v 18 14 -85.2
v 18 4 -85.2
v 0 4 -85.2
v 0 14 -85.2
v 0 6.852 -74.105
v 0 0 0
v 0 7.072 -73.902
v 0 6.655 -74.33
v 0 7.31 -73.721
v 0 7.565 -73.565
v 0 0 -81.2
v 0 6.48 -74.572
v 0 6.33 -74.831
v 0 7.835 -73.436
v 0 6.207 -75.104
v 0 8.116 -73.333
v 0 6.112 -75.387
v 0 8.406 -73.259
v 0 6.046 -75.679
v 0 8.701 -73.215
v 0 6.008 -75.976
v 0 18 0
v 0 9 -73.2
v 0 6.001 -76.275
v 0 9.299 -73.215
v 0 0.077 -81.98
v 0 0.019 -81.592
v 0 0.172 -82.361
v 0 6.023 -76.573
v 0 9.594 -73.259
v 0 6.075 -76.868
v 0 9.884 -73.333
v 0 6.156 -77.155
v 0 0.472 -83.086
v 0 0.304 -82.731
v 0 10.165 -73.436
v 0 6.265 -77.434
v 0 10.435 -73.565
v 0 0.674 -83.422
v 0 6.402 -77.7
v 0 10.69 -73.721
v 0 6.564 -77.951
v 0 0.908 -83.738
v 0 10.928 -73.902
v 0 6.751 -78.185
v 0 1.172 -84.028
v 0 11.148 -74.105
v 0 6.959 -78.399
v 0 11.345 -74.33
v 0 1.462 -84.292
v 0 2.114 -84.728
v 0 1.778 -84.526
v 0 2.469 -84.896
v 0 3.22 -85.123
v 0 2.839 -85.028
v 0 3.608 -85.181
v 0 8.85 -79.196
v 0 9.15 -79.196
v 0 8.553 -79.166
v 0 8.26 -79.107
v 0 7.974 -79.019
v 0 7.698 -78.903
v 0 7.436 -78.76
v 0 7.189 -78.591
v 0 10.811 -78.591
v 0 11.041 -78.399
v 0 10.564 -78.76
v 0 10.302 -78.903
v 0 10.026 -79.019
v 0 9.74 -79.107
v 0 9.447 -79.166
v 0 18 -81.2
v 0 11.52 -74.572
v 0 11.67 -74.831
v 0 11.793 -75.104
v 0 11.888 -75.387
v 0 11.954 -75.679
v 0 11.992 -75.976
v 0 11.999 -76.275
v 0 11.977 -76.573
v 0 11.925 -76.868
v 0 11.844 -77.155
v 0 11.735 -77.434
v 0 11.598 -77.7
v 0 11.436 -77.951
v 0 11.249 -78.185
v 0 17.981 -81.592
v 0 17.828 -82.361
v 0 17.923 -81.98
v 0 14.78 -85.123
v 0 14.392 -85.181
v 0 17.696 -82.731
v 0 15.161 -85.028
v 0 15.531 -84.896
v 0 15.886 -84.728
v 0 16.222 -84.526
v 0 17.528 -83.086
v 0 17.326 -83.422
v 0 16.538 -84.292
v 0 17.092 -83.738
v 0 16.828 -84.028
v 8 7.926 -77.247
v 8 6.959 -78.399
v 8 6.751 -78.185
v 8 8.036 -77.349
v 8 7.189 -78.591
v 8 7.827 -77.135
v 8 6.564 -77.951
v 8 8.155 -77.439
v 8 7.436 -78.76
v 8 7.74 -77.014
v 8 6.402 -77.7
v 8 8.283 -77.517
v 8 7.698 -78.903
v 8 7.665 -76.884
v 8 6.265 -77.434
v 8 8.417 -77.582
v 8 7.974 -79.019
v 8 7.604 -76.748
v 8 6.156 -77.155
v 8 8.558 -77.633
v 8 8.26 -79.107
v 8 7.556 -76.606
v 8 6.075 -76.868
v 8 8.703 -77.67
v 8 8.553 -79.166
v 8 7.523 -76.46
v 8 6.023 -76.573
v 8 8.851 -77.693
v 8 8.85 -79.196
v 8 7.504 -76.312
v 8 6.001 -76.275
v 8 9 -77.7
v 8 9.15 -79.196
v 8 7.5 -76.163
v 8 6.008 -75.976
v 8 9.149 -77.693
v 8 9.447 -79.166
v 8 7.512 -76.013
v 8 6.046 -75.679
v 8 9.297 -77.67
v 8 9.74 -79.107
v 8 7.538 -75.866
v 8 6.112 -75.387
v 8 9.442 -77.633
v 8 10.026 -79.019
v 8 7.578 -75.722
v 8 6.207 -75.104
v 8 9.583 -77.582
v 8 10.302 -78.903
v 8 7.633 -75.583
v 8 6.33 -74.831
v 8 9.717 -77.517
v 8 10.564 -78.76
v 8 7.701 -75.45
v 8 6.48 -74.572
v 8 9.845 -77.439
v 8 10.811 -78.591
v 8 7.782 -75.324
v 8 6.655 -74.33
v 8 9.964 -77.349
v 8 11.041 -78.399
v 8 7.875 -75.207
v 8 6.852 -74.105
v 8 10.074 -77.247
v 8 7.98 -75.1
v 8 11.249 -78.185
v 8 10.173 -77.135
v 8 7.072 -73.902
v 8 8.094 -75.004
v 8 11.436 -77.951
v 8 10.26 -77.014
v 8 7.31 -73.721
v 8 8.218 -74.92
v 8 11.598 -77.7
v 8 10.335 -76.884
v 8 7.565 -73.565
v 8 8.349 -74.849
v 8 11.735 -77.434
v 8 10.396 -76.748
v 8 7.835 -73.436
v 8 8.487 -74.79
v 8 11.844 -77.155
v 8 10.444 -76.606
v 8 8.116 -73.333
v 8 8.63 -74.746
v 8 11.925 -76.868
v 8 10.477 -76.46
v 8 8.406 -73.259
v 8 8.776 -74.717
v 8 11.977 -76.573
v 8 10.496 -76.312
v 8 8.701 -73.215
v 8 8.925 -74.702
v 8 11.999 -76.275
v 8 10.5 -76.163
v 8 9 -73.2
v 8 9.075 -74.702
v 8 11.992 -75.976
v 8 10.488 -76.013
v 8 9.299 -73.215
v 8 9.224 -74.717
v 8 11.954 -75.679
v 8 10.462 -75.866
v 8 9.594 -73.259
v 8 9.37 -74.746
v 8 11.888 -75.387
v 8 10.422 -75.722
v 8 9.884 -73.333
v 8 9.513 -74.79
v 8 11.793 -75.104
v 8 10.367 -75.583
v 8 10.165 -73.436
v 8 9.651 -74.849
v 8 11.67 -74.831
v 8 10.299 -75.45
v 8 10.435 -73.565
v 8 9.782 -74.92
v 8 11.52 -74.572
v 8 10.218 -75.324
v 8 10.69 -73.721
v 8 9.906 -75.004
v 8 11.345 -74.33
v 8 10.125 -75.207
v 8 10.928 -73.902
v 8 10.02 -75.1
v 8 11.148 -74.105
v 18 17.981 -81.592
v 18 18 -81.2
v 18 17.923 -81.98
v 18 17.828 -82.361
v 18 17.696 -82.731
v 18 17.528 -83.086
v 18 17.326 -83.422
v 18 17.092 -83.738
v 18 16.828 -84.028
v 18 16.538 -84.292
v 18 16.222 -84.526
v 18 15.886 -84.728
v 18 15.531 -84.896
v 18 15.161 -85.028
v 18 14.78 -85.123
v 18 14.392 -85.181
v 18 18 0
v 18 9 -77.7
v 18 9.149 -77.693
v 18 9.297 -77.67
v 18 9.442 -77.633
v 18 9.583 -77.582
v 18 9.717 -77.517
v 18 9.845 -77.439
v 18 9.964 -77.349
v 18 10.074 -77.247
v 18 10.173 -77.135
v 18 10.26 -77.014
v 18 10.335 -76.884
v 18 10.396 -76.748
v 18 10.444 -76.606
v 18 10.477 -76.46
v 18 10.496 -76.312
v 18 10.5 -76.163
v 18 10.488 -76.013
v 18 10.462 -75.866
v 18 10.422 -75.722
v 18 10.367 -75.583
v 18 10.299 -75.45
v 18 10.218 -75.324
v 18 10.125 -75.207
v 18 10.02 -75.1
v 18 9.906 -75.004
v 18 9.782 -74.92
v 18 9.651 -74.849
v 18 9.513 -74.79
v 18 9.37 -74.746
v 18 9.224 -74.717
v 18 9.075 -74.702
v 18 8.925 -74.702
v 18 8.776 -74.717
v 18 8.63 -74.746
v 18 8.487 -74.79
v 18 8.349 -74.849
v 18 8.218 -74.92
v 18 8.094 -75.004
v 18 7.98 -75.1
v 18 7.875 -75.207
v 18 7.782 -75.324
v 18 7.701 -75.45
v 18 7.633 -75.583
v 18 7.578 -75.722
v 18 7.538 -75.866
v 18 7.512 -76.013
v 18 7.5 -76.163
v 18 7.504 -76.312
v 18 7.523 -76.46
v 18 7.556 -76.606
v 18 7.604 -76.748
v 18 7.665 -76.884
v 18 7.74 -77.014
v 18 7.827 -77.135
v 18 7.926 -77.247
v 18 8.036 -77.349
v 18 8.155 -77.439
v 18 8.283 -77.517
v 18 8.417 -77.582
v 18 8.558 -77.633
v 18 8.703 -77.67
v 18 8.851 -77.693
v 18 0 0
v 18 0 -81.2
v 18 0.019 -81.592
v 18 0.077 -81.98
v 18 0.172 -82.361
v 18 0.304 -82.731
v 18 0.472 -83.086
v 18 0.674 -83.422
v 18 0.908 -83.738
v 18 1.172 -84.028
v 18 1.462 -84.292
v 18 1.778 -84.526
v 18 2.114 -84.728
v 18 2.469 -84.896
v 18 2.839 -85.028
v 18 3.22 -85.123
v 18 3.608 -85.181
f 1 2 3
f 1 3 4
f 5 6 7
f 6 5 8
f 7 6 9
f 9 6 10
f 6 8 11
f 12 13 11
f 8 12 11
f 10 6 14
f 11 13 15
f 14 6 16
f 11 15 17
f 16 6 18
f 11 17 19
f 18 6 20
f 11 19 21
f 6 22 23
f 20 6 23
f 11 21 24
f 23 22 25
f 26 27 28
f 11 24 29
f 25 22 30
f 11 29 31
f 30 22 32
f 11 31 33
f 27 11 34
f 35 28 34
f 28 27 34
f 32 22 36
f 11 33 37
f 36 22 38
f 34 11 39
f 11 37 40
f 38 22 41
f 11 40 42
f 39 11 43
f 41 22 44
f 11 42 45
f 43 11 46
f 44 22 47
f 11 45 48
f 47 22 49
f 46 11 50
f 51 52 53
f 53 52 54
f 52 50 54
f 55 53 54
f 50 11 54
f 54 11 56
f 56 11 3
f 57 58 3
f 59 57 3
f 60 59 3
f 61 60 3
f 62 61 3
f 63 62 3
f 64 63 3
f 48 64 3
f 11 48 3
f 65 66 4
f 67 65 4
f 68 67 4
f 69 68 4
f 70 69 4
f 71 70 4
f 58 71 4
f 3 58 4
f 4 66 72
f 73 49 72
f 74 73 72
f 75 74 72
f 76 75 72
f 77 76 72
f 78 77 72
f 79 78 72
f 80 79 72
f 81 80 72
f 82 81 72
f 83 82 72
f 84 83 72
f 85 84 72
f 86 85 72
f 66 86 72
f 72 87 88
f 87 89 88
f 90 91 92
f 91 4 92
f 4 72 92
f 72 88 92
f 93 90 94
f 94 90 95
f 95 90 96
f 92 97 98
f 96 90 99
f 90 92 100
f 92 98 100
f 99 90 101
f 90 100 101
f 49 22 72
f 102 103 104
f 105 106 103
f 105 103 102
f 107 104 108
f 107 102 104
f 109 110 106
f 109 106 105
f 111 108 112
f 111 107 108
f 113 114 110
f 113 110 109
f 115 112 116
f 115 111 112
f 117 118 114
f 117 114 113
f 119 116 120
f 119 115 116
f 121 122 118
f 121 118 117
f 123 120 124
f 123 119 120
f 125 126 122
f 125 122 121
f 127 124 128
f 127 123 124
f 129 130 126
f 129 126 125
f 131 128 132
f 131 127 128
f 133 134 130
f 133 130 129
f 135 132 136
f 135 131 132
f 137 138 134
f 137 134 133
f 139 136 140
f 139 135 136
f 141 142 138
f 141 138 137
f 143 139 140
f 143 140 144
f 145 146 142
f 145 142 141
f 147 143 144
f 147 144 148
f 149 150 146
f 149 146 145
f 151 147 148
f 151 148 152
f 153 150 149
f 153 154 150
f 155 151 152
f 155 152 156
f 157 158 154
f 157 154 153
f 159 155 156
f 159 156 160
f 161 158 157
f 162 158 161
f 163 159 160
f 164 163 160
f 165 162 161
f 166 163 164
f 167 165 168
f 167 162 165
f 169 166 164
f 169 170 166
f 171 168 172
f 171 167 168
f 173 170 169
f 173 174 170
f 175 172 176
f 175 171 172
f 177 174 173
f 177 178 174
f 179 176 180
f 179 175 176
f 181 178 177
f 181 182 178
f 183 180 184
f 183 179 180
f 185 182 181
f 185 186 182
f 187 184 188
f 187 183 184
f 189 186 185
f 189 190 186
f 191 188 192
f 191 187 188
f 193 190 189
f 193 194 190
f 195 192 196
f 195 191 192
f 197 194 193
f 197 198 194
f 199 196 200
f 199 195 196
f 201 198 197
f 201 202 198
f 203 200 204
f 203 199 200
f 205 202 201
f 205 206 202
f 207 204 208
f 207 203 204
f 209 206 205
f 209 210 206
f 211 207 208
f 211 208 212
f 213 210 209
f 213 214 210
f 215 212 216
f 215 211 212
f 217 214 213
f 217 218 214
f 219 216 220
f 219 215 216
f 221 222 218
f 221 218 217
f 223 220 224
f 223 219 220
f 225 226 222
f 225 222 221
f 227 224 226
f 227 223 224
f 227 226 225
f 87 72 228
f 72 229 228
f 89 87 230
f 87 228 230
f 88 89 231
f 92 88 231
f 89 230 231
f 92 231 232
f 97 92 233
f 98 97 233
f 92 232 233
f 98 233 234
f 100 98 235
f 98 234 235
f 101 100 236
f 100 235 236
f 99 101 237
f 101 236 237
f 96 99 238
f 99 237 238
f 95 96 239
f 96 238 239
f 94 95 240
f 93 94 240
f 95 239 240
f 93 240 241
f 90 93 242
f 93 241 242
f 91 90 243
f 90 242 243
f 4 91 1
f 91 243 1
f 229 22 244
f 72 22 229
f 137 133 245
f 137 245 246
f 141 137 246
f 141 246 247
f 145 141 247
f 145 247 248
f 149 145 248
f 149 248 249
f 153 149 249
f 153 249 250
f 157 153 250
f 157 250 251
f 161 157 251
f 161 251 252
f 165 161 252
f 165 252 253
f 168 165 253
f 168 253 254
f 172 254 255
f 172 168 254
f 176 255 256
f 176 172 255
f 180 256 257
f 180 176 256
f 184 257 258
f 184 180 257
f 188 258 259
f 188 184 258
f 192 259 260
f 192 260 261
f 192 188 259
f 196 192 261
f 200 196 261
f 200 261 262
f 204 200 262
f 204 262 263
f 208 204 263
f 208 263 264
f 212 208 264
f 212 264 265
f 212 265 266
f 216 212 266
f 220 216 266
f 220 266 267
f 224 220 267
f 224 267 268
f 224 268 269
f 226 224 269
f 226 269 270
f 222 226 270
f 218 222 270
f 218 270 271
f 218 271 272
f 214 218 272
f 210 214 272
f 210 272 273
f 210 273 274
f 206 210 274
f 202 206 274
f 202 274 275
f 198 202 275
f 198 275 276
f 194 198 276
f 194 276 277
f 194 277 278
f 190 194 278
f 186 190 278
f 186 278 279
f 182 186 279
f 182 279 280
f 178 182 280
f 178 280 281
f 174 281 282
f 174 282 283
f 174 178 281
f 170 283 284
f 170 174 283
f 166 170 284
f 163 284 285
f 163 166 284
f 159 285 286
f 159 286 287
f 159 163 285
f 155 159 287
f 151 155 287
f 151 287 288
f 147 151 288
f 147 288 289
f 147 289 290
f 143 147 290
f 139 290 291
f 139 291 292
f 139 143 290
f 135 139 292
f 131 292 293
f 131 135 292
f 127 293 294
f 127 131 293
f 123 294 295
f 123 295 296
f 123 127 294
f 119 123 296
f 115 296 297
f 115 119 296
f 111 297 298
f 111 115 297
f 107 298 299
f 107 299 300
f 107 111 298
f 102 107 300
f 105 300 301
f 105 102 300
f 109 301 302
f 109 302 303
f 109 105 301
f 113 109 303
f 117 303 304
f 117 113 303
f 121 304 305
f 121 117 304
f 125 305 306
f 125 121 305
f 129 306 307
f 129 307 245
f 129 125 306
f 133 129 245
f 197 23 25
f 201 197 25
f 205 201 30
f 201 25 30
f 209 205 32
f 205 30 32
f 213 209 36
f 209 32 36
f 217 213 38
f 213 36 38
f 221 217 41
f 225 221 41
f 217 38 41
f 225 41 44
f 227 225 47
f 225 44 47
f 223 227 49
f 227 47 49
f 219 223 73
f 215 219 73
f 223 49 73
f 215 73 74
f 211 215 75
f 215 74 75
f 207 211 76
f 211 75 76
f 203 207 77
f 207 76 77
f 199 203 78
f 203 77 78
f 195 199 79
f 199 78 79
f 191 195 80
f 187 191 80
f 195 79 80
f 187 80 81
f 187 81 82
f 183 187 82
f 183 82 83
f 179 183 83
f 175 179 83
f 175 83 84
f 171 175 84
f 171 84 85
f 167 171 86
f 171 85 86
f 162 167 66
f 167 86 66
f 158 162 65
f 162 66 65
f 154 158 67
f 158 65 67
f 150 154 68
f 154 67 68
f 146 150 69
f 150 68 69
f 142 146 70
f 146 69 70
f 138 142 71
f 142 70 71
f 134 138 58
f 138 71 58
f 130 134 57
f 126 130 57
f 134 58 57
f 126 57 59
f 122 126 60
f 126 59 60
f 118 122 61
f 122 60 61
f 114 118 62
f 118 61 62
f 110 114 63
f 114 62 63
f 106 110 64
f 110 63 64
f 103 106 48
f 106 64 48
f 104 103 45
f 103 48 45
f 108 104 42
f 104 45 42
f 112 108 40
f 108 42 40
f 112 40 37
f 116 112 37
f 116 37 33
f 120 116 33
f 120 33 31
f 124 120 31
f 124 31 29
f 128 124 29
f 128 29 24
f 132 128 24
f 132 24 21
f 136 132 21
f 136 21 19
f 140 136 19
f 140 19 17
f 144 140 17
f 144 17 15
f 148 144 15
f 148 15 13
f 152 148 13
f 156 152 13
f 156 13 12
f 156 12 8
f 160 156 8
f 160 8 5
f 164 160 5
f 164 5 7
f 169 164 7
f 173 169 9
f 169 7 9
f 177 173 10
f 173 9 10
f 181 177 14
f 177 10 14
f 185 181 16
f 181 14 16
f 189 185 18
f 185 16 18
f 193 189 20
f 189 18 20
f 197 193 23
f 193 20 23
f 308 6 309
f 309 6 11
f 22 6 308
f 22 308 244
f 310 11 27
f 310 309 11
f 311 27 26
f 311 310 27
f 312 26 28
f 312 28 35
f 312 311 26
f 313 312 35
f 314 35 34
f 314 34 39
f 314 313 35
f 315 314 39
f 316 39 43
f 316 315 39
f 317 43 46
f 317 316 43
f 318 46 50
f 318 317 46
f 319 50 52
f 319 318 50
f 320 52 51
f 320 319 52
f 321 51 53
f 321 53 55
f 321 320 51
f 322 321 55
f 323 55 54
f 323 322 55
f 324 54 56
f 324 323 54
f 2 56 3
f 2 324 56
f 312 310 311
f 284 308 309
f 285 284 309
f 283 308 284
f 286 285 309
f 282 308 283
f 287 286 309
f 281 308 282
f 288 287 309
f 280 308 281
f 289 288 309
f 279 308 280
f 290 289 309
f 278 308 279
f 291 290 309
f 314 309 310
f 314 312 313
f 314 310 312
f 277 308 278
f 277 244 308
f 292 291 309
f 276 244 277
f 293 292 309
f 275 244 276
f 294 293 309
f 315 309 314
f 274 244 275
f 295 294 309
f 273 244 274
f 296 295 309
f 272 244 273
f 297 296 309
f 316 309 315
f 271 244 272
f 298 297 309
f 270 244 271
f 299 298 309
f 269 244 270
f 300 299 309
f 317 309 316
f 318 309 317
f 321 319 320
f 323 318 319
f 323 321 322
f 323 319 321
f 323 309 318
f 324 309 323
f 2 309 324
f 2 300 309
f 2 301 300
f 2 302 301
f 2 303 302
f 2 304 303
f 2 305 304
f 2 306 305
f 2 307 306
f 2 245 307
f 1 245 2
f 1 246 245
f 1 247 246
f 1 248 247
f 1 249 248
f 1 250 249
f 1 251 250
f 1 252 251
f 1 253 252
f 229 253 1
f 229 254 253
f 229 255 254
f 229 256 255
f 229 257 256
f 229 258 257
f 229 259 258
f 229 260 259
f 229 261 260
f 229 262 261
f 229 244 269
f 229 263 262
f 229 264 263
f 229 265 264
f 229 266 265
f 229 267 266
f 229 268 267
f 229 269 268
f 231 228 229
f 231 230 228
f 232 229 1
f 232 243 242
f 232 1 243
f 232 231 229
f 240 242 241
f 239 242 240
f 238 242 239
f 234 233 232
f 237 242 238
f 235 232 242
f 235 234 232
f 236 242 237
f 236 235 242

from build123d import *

# Parameters (mm, degrees)
SKETCH1_W           = 85.2
SKETCH1_H           = 18
SKETCH1_R           = 1.5
BOSS_EXTRUDE1_DEPTH = 18
SKETCH2_R           = 3
CUT_EXTRUDE1_DEPTH  = 8
FILLET1_R           = 4


with BuildPart() as part:
    # Sketch1 → Boss-Extrude1 (new body)
    with BuildSketch(Plane(origin=(0, 0, 0), x_dir=(0, 0, -1), z_dir=(1, 0, 0))):
        with Locations((42.6, 9)):
            Rectangle(SKETCH1_W, SKETCH1_H)
        with Locations((76.2, 9)):
            Circle(SKETCH1_R, mode=Mode.SUBTRACT)
    extrude(amount=BOSS_EXTRUDE1_DEPTH)

    # Sketch2 → Cut-Extrude1 (cut)
    with BuildSketch(Plane.ZY):
        with Locations((-76.2, 9)):
            Circle(SKETCH2_R)
    extrude(amount=-CUT_EXTRUDE1_DEPTH, mode=Mode.SUBTRACT)

    # Fillet1
    fillet1_edges = [part.edges().sort_by_distance(p)[0] for p in [
        (9, 18, -85.2),
        (9, 0, -85.2),
    ]]
    fillet(fillet1_edges, radius=FILLET1_R)


solid = part.part
